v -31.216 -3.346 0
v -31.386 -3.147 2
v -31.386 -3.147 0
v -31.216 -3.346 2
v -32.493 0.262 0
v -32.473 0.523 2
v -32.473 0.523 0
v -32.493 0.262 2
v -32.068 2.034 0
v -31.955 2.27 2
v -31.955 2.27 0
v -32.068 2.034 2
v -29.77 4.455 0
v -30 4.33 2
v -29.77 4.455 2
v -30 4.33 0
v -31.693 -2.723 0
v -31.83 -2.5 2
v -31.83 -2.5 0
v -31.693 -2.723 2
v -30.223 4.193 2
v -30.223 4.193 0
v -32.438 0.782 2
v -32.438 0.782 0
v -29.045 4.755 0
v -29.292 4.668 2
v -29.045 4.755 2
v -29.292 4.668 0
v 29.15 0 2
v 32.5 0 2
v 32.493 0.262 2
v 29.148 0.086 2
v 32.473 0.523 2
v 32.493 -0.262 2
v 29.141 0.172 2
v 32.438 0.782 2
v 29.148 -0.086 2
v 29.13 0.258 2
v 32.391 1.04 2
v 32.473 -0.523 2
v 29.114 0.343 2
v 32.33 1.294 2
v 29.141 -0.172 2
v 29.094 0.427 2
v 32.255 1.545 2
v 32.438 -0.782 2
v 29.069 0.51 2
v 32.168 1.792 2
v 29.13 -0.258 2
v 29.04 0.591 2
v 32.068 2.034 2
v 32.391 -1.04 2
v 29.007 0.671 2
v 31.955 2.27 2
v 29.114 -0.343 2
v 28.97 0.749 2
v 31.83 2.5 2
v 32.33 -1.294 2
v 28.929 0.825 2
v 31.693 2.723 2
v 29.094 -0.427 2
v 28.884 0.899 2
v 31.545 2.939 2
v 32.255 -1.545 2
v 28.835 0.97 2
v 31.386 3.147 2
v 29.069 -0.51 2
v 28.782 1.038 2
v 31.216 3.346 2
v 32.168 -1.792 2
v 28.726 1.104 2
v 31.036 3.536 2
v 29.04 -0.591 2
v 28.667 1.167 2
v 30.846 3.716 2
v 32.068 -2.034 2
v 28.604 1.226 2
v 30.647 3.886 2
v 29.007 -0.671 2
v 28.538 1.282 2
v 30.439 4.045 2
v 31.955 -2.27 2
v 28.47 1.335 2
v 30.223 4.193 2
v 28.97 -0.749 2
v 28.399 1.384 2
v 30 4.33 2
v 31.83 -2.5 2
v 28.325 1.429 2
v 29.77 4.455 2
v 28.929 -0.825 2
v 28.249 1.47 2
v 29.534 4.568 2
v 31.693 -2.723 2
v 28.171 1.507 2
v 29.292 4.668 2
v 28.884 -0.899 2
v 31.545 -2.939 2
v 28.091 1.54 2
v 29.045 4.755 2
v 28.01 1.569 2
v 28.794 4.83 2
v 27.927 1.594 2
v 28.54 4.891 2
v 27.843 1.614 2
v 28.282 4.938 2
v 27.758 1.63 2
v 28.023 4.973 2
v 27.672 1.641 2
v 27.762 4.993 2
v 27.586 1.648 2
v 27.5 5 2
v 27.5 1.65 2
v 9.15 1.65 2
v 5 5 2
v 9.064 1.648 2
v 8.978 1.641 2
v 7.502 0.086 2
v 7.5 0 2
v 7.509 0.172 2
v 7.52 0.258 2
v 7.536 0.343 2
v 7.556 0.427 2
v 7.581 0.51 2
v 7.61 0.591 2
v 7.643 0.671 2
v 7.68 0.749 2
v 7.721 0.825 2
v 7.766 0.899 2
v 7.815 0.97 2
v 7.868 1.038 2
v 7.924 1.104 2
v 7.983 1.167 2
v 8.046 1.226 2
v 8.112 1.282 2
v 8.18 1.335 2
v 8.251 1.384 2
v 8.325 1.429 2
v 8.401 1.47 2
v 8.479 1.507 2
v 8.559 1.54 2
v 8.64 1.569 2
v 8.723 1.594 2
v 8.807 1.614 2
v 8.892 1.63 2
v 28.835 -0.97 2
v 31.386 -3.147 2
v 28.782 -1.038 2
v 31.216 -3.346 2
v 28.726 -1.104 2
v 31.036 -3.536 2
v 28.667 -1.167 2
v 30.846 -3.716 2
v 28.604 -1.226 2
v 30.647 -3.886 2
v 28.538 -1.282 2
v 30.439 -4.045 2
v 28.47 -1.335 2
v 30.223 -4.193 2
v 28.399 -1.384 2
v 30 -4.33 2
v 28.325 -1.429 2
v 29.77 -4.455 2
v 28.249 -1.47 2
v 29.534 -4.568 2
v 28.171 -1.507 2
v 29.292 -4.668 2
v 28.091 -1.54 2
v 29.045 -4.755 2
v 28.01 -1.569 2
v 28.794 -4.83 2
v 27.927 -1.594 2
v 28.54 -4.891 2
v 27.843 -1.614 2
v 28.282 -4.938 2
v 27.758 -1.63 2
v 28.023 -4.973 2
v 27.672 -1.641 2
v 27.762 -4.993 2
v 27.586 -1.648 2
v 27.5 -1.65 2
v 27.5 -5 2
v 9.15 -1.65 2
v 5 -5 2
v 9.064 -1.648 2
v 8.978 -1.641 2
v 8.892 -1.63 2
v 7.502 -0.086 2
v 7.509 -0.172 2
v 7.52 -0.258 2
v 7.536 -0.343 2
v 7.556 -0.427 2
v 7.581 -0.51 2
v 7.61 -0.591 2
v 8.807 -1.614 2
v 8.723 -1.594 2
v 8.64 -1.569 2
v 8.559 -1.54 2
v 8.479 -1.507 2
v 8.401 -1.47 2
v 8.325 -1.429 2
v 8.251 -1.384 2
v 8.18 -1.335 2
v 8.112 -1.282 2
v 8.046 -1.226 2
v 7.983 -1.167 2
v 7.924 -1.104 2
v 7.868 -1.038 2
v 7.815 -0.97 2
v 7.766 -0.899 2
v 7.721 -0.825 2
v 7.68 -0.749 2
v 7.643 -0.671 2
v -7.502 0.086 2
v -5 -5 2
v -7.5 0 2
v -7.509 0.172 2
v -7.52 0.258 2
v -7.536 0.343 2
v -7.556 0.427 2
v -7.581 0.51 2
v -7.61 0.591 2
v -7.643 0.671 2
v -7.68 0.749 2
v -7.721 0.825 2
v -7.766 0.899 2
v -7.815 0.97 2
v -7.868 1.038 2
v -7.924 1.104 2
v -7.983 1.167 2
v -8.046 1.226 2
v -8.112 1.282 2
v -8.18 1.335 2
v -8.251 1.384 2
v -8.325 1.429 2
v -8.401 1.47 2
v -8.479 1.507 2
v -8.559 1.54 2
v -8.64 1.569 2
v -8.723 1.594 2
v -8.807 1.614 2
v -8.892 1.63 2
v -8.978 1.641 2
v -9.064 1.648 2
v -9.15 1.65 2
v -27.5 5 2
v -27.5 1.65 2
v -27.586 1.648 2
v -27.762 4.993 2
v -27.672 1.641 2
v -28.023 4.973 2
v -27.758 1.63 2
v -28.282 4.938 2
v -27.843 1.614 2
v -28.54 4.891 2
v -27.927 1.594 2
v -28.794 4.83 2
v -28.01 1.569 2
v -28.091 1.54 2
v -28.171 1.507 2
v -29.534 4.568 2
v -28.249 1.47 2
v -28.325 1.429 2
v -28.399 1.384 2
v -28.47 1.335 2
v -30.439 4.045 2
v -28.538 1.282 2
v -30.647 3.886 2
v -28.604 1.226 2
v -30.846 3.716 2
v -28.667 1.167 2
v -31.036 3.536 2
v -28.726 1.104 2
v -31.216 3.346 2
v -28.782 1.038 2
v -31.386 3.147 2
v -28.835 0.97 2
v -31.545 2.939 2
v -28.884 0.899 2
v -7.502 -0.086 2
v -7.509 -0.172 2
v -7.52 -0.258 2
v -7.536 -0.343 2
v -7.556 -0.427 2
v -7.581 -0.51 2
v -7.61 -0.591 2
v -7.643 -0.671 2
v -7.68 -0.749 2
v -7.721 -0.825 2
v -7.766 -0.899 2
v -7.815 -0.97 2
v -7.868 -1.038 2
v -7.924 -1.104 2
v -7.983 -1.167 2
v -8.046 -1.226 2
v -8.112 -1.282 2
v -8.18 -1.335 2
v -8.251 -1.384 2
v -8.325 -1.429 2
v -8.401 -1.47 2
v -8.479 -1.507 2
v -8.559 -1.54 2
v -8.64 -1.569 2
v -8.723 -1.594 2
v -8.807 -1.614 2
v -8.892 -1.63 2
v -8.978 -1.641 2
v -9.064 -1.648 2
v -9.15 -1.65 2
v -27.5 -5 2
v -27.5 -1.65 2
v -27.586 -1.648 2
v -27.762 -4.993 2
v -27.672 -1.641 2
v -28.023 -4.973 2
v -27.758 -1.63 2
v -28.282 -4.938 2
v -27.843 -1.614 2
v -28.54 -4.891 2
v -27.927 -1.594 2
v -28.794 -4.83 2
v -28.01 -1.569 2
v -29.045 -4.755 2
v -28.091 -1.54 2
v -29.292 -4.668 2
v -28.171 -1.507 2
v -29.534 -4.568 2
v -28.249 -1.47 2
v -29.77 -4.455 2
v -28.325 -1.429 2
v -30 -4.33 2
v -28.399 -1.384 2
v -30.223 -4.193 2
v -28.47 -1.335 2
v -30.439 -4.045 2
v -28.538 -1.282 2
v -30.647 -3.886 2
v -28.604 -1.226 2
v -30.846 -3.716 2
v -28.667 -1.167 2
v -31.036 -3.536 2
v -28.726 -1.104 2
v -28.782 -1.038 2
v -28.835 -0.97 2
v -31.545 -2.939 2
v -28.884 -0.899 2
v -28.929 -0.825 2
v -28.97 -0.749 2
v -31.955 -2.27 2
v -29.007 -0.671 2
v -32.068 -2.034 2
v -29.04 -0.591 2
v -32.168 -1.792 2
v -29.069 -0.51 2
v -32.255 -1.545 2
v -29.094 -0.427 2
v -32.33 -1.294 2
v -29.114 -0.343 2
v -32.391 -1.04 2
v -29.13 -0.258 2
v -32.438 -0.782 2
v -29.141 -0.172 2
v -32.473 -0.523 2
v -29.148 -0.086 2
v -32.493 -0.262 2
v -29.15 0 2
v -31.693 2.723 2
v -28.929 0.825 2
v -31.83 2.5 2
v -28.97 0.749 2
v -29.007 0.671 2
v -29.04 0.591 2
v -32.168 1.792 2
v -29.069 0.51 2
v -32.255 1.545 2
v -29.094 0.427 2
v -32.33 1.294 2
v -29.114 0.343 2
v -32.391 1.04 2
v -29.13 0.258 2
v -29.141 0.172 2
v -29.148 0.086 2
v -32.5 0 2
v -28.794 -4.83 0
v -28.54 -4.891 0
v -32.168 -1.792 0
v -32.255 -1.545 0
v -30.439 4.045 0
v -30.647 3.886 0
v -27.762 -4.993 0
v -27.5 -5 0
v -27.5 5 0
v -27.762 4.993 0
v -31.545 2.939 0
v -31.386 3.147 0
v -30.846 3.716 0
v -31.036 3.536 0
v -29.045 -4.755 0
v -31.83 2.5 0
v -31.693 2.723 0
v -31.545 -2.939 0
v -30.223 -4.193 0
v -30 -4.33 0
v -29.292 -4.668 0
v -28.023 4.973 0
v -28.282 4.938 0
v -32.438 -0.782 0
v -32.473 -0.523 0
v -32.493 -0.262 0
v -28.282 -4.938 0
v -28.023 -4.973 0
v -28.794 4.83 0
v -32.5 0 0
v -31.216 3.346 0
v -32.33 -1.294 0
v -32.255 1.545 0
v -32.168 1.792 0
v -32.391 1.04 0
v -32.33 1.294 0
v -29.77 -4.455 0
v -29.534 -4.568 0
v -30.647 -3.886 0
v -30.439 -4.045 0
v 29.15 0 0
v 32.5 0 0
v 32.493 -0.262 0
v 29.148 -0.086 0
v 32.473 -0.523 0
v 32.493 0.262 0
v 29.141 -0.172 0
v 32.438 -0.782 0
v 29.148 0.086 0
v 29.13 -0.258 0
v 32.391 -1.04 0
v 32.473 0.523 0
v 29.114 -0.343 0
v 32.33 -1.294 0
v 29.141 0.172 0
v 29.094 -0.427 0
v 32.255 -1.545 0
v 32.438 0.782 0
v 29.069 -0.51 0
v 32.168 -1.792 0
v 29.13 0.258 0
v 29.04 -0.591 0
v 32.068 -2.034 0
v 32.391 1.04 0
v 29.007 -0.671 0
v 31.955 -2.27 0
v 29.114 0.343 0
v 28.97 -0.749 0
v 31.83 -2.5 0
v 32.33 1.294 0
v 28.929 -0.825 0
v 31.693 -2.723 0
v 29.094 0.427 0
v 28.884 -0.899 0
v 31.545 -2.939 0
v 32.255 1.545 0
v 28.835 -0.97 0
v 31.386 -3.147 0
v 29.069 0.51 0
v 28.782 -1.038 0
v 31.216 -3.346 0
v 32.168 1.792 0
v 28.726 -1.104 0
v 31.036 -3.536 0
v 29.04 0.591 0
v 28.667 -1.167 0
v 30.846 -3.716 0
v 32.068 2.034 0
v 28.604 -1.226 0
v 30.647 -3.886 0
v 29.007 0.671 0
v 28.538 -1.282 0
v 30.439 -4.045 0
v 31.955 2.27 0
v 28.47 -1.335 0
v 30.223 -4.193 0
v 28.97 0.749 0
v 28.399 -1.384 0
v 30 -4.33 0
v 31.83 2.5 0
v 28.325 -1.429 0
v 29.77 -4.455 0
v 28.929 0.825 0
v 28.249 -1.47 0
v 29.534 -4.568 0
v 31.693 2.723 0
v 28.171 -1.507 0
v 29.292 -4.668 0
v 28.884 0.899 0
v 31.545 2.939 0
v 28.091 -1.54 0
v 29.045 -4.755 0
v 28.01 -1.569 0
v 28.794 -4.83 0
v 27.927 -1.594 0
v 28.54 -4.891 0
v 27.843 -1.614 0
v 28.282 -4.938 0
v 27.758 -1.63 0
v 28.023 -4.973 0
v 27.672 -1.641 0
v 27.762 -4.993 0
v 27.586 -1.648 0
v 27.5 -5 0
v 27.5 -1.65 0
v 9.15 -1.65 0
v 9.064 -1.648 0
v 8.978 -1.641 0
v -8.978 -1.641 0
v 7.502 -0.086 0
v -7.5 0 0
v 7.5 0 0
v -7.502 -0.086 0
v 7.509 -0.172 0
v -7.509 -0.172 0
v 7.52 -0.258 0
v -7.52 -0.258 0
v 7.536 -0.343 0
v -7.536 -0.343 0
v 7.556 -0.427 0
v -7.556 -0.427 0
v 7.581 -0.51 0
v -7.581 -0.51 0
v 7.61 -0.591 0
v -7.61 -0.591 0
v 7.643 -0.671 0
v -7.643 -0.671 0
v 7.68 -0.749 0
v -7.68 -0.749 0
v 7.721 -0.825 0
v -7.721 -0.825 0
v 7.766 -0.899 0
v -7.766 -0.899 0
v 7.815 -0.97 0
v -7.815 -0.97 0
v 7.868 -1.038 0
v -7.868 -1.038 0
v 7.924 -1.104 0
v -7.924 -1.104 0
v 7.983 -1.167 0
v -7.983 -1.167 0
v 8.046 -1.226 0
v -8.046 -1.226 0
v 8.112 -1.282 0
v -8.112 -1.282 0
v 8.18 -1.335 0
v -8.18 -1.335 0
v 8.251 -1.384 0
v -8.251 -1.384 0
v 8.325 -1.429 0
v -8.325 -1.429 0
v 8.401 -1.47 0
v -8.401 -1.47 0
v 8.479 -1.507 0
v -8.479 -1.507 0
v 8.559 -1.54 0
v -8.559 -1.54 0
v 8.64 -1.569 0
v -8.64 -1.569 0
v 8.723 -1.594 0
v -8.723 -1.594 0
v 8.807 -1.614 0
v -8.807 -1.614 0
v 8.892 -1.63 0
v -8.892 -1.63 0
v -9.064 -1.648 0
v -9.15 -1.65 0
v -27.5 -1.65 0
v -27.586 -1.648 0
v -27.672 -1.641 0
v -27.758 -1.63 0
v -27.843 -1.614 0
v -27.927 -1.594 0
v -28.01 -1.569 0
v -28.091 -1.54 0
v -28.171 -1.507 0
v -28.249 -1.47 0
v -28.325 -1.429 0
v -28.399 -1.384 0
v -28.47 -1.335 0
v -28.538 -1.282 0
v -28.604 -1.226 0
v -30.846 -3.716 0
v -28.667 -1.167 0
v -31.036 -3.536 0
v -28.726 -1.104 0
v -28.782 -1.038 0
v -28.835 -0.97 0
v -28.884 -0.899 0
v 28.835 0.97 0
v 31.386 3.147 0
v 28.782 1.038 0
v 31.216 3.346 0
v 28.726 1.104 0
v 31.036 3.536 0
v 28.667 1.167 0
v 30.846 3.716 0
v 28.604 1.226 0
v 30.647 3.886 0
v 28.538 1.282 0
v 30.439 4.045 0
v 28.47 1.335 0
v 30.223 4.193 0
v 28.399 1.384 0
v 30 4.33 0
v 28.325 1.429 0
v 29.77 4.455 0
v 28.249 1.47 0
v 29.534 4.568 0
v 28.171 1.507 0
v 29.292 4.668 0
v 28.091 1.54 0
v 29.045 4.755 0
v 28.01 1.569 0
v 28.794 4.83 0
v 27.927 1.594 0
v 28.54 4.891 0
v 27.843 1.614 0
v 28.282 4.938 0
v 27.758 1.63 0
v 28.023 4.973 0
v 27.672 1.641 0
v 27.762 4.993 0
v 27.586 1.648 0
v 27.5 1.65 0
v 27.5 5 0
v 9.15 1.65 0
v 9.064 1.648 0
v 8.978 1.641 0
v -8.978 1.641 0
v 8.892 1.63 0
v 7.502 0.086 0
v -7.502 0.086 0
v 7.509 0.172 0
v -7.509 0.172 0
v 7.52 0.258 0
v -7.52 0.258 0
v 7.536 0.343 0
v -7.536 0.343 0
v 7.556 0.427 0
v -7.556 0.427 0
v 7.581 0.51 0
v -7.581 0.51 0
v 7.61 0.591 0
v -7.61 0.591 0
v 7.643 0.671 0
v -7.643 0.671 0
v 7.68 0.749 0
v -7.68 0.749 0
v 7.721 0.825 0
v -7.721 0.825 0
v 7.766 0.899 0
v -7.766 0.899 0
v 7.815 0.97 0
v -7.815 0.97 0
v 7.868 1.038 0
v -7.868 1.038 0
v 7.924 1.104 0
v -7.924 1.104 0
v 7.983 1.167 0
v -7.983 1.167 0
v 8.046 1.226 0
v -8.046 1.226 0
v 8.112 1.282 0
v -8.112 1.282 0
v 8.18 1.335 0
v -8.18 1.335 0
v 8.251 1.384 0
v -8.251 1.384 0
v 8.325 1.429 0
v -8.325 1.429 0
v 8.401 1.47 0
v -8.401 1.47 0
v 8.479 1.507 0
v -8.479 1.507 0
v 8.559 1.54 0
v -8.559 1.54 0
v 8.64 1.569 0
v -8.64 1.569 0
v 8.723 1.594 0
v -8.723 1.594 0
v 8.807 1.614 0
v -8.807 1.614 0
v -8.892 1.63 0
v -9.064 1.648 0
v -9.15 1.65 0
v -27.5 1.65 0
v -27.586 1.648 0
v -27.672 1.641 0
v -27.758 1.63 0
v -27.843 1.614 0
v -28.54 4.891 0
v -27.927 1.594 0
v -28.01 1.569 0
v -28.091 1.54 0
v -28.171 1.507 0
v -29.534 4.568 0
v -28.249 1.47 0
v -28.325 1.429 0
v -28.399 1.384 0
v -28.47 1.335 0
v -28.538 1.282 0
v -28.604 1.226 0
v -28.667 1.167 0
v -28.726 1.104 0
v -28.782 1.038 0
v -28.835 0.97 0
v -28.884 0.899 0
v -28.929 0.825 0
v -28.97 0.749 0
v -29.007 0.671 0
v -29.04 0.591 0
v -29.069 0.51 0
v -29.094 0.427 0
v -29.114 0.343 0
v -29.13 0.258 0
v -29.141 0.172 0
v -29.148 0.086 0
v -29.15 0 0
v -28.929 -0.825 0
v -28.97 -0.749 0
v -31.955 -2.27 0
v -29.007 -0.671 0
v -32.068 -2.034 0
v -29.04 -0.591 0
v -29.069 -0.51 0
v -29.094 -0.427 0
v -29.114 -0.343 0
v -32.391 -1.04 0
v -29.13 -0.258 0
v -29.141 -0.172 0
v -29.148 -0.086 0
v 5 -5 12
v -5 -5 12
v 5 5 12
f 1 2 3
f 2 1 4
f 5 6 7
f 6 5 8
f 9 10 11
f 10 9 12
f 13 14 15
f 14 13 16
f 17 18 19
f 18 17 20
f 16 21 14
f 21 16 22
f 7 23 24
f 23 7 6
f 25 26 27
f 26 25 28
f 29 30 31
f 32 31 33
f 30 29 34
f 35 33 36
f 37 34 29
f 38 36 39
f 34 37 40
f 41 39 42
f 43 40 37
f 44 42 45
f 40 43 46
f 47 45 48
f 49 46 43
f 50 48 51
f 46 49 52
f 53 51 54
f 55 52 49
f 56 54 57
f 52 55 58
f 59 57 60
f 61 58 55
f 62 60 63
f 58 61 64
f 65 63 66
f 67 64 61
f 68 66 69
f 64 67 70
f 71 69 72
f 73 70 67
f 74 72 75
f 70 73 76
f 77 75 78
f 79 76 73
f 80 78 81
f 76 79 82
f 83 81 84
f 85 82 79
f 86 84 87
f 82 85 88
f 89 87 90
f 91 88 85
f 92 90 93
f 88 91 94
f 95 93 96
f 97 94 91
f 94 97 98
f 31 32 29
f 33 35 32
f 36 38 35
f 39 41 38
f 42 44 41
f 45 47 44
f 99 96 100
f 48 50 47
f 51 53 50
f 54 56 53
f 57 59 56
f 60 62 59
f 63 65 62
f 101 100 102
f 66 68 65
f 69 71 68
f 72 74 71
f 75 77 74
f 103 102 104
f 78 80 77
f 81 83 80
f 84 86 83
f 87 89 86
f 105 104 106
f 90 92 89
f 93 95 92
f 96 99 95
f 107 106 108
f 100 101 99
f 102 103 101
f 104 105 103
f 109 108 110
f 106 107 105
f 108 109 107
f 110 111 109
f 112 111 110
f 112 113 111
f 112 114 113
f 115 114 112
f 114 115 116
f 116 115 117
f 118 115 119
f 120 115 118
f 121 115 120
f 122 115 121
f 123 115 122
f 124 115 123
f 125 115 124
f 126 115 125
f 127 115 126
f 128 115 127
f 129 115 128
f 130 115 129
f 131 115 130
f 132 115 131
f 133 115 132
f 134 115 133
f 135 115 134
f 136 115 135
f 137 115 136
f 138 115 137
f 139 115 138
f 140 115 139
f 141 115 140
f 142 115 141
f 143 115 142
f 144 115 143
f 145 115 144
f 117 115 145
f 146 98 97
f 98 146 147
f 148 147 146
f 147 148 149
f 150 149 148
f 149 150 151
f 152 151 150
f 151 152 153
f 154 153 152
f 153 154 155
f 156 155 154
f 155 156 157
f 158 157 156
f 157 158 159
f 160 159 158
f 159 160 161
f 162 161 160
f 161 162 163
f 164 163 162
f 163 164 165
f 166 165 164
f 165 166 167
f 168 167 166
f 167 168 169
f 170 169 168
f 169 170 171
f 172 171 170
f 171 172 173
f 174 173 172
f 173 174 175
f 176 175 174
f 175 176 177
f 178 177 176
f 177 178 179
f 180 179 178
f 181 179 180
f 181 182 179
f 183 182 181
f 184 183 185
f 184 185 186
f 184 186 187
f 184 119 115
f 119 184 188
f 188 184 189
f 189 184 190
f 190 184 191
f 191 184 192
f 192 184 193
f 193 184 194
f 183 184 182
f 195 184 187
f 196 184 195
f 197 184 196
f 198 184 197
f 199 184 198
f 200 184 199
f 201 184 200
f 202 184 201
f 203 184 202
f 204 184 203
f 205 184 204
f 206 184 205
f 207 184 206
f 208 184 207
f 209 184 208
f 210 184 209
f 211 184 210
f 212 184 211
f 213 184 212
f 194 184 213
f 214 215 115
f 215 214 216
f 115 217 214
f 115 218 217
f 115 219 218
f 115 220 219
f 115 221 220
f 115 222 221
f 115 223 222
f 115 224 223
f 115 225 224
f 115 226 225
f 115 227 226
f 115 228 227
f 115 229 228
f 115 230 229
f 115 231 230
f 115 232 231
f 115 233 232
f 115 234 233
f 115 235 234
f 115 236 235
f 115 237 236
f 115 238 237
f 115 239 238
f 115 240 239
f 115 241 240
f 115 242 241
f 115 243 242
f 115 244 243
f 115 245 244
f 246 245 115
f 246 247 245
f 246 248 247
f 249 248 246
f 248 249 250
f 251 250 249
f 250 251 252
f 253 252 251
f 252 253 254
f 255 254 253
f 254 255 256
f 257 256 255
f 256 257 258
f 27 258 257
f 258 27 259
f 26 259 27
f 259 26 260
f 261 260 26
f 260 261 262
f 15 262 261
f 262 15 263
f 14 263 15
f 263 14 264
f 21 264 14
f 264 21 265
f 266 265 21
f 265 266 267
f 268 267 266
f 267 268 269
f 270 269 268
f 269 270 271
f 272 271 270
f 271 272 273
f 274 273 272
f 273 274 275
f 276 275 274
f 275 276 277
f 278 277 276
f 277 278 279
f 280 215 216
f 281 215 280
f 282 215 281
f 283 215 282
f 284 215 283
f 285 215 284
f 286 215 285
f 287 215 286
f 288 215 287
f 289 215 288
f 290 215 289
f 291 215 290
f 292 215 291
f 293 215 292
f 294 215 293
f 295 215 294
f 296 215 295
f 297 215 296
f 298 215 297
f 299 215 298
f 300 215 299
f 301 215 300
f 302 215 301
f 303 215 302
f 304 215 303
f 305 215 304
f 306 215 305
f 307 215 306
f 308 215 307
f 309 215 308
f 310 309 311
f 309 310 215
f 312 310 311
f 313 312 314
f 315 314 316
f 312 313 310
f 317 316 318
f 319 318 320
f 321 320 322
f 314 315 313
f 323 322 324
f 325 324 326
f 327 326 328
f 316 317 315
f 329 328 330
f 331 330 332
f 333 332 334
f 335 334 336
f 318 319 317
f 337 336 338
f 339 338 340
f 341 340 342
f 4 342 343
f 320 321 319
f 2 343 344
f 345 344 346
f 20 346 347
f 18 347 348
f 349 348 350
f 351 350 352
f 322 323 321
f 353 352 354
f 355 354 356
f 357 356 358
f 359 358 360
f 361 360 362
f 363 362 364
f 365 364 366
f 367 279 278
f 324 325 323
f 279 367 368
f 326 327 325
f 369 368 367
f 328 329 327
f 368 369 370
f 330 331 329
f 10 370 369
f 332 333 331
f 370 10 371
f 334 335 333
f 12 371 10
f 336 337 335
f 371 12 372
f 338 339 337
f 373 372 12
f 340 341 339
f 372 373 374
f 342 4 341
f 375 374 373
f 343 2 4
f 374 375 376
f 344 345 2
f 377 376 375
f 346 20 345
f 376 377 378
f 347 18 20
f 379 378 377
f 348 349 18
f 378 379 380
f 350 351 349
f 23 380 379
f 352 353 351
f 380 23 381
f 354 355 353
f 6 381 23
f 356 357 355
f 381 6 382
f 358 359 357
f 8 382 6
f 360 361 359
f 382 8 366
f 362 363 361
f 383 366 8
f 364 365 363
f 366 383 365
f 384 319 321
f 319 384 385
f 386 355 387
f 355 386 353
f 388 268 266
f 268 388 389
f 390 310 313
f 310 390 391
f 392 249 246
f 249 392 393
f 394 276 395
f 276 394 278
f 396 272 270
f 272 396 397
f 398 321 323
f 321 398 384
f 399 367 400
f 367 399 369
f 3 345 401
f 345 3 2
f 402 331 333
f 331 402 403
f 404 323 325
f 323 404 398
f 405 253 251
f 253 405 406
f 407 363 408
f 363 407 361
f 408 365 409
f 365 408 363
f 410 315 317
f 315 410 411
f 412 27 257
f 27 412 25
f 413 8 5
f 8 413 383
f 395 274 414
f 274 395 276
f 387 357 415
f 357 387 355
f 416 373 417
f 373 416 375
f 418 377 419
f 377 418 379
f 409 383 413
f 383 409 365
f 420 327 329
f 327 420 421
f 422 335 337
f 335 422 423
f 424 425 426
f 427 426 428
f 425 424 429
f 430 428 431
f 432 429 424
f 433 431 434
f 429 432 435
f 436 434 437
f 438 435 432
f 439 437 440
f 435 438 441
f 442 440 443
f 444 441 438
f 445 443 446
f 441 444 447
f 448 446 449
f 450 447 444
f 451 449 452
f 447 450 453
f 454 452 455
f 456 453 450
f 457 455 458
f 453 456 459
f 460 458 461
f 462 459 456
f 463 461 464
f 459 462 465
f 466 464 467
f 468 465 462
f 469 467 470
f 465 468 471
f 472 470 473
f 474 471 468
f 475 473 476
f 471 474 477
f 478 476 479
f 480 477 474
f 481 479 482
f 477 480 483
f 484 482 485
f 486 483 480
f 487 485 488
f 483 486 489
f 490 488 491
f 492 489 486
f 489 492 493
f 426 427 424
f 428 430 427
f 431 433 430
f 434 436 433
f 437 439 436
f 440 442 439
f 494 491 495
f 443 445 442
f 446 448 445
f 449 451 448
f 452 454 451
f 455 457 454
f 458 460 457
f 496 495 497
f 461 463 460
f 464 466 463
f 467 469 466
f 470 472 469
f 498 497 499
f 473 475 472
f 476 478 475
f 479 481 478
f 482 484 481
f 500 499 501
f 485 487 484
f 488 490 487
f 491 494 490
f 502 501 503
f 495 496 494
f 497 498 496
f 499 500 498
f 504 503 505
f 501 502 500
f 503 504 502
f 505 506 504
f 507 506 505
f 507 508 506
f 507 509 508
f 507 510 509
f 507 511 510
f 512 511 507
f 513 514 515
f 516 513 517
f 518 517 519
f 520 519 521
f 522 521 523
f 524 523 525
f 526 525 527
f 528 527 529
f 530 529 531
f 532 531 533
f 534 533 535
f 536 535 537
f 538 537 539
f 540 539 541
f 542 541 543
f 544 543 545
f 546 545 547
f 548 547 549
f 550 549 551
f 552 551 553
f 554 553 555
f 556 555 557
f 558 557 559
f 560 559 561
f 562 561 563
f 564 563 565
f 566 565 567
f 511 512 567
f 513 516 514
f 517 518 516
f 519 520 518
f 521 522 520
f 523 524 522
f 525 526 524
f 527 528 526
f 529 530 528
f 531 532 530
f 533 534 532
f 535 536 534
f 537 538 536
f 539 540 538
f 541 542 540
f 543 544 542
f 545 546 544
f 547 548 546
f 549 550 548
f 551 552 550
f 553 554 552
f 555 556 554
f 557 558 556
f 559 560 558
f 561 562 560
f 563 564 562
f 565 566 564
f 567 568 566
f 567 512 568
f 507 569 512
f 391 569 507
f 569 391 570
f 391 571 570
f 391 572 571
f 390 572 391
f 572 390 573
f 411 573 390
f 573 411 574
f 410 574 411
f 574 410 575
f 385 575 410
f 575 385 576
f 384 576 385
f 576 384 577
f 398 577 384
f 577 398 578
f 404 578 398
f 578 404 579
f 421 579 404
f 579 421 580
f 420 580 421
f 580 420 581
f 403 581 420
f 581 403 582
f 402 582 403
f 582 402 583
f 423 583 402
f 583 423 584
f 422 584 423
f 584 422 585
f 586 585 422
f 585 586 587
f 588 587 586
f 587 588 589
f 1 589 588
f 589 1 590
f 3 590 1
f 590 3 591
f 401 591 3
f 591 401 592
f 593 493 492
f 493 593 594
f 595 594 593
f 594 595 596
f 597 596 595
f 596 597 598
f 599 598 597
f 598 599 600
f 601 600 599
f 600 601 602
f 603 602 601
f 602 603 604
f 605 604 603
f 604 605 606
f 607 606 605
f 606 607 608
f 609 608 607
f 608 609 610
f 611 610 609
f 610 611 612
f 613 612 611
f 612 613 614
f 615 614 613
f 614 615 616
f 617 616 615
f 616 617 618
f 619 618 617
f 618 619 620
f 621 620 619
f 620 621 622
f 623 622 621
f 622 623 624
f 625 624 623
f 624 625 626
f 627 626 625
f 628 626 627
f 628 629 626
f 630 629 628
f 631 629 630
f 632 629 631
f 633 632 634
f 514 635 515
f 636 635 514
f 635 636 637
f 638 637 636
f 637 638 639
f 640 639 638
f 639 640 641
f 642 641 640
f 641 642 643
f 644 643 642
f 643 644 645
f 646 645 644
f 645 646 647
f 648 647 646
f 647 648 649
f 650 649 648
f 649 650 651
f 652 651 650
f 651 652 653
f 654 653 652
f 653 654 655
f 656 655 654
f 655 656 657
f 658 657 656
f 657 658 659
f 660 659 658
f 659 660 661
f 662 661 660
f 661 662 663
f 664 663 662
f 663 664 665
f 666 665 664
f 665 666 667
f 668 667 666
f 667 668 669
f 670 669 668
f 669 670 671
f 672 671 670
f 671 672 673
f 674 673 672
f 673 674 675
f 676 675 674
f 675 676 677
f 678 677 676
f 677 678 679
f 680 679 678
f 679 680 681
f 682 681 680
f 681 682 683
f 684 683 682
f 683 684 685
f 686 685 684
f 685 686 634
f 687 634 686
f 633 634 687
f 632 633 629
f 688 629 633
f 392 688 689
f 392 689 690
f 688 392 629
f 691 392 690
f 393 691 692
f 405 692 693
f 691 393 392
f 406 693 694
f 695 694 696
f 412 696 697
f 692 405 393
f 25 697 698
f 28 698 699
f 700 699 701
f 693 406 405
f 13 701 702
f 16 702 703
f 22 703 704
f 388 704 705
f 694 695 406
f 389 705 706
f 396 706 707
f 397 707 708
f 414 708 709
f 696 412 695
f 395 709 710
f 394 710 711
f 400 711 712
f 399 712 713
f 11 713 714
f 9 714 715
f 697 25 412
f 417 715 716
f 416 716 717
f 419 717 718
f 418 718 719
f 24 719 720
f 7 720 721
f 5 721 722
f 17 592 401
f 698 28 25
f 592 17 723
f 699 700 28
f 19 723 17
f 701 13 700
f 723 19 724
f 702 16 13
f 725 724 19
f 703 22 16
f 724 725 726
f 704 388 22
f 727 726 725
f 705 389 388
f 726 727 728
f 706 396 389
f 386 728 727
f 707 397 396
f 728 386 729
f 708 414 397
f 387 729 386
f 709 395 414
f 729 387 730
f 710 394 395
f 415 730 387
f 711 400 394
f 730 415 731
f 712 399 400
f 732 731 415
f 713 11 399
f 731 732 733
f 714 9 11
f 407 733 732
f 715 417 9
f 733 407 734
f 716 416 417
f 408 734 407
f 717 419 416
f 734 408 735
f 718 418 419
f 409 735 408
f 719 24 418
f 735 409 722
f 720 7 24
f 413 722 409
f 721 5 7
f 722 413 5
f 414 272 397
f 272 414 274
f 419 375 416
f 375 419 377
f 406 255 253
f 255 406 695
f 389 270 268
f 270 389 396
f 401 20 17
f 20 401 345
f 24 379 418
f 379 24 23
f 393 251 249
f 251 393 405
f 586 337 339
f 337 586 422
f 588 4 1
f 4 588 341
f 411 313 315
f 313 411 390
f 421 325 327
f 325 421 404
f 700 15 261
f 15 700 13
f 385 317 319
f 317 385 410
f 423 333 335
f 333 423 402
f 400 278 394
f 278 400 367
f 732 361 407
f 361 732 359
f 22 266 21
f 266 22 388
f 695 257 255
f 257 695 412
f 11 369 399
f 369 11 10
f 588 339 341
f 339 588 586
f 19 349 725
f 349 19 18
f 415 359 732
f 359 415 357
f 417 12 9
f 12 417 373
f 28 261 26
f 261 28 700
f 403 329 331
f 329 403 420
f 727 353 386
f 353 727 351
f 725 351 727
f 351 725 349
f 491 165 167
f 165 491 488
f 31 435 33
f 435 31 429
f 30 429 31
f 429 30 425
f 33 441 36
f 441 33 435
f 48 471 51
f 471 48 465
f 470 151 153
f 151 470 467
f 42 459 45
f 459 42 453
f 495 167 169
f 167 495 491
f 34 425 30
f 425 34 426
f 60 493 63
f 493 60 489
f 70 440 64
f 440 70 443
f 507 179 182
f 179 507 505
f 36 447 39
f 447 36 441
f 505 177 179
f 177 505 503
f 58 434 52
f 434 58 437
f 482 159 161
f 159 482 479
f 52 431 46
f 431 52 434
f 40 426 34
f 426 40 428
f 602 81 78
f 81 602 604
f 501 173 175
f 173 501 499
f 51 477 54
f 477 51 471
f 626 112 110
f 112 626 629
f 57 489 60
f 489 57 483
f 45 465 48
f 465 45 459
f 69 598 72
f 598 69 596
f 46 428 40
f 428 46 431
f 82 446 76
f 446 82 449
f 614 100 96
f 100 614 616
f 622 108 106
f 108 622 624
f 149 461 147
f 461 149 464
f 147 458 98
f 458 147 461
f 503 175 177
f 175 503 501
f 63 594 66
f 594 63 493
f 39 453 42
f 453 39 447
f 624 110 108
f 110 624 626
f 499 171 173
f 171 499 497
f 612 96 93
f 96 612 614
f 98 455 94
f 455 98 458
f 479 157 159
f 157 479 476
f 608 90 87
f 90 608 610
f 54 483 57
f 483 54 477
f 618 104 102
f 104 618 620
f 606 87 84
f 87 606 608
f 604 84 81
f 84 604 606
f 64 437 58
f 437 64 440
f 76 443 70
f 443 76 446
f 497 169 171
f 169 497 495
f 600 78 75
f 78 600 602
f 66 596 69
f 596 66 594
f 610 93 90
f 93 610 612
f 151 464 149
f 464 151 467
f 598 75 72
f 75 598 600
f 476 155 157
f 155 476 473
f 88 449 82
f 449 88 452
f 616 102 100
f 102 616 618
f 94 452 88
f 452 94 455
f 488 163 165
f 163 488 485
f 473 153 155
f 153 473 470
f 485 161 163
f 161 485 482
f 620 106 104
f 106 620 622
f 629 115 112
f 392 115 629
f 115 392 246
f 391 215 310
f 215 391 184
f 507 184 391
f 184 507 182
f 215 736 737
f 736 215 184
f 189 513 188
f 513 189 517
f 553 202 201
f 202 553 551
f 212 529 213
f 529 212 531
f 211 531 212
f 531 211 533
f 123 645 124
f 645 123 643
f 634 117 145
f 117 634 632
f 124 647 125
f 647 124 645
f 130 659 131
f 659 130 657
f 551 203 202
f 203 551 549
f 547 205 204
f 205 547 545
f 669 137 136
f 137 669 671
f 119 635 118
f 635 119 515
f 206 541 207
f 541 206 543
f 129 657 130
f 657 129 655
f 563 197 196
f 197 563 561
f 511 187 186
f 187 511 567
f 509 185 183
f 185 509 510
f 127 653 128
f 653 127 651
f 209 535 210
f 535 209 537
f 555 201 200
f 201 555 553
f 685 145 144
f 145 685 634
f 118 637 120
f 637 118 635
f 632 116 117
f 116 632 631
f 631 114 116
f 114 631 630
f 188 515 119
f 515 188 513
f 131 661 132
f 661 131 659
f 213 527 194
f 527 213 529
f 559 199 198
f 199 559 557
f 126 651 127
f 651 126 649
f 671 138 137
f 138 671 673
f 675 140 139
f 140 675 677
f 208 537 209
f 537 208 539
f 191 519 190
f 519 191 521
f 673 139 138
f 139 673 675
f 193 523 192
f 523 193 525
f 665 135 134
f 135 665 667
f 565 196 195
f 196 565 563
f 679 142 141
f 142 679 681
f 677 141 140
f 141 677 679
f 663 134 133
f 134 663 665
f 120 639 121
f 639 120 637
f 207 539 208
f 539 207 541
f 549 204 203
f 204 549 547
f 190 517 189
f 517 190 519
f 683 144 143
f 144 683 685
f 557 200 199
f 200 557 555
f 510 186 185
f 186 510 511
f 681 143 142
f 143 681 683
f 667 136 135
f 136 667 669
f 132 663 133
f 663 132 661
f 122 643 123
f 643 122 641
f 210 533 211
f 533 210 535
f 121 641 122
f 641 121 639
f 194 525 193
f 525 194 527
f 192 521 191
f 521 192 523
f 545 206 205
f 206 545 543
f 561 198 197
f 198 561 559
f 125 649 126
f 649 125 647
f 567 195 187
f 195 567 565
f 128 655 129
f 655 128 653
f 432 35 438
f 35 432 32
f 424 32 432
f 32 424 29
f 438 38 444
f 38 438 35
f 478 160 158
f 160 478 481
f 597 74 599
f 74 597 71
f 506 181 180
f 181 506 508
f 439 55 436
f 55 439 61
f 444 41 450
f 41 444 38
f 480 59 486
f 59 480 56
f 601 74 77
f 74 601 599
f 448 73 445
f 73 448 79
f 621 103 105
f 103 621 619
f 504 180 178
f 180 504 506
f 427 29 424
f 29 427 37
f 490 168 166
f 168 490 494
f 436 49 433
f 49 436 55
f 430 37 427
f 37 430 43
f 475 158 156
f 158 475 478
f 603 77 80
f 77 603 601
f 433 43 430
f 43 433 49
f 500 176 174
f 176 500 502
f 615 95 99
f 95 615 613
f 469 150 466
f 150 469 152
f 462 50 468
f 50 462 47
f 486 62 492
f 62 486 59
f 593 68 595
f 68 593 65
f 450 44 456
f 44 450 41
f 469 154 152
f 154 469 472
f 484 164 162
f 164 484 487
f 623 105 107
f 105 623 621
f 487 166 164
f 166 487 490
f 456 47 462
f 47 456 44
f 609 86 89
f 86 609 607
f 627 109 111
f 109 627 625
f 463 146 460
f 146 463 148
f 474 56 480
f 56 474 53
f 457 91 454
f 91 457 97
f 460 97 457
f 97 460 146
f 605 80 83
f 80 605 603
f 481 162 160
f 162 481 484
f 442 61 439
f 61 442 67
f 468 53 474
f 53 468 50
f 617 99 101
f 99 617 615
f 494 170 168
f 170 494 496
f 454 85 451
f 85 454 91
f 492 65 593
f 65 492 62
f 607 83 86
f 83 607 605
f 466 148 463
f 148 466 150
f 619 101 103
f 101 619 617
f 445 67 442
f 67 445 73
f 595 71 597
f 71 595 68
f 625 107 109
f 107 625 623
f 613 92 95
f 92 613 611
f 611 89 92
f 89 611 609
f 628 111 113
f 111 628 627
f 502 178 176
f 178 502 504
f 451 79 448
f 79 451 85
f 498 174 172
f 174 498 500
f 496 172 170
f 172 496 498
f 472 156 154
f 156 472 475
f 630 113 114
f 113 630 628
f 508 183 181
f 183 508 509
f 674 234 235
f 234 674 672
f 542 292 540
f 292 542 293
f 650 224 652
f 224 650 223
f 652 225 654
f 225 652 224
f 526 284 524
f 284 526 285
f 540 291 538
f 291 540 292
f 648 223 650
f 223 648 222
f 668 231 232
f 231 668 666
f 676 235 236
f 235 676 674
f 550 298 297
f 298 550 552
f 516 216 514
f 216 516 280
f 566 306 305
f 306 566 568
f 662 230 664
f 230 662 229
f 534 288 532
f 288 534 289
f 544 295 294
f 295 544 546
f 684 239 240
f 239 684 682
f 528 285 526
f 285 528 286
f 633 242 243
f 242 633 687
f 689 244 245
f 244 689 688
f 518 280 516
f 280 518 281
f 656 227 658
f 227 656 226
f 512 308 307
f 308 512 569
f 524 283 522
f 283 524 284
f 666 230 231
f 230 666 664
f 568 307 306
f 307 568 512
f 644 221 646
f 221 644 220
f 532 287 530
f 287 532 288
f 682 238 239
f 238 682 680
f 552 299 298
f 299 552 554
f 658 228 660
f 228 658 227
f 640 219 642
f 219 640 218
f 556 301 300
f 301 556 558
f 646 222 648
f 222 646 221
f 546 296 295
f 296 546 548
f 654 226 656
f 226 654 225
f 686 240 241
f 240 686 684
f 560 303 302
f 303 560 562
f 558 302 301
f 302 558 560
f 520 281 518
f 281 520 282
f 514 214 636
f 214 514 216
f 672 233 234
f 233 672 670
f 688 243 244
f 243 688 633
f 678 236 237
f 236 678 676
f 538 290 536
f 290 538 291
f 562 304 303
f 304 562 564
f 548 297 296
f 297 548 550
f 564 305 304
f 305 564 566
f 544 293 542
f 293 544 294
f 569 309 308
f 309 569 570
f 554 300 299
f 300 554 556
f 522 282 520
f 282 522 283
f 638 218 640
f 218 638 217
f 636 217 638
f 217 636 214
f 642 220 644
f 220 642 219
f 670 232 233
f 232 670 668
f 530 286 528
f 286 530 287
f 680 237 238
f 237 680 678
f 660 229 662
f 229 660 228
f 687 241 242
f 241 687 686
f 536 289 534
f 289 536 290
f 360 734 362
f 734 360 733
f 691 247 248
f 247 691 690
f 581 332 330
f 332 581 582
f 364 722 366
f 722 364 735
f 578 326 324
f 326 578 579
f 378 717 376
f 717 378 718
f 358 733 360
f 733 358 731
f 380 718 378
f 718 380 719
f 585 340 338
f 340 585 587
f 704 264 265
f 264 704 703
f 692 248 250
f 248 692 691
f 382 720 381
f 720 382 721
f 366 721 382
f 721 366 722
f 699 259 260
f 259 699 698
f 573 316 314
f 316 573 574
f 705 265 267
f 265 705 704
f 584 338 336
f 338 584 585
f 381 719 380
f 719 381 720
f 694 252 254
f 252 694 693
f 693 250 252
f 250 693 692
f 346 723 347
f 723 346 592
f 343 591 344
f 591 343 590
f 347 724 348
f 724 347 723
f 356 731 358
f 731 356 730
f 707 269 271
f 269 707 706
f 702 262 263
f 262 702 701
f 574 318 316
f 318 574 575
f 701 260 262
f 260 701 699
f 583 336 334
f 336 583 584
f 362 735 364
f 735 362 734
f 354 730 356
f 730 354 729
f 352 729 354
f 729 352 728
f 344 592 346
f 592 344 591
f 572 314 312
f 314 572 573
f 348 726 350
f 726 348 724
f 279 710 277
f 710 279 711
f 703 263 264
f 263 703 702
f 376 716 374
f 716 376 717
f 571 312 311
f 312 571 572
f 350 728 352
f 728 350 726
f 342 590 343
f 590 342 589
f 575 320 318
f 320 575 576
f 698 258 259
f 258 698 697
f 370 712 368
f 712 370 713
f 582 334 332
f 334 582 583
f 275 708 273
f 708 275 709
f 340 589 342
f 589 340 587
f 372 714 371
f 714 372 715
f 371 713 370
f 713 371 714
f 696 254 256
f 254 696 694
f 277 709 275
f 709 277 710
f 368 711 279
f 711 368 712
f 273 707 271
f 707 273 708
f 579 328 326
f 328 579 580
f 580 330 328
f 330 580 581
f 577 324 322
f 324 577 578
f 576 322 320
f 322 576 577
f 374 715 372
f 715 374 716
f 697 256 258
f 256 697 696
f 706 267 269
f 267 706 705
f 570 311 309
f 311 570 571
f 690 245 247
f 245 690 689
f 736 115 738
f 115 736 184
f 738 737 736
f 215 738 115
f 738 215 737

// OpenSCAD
// Picture hanger
// Picutre part / left side
// RealGusi (C) 2020
// https://maniana.net
// Creative Commons - Attribution - Non-Commercial - Share Alike license.

$fn = 120;

$thickness = 2;
$slide_length = 20;
$width = 10;
$screw_width = 3.3;

$wedge_section = 15;

module whole_part() {
  translate( [-$slide_length - $wedge_section / 2, 0, 0])
  cylinder( h = $thickness, r = $width/ 2);
    
  translate( [ $slide_length + $wedge_section / 2, 0, 0])
  cylinder( h = $thickness, r = $width/ 2);
    
  translate( [-$slide_length - $wedge_section / 2, -$width / 2, 0])
  cube( [ $slide_length * 2 + $wedge_section, $width, $thickness]);
}

module screw_hole( angle) {
  rotate( [ 0, 0, angle])
  translate( [ $wedge_section / 2, 0, 0]) 
  translate( [ $screw_width / 2, 0, 0]) 
  cylinder( h = $thickness, r = $screw_width/ 2);
    
  rotate( [ 0, 0, angle])
  translate( [ $wedge_section / 2, 0, 0]) 
  translate( [ $slide_length, 0, 0]) 
  cylinder( h = $thickness, r = $screw_width/ 2);
    
  rotate( [ 0, 0, angle])
  translate( [ $wedge_section / 2, 0, 0]) 
  translate( [ $screw_width / 2, - $screw_width / 2, 0]) 
  cube( [ $slide_length - $screw_width / 2, $screw_width, $thickness]);
}    

difference() {
  whole_part();
  screw_hole( 0);
  screw_hole( 180);
}

difference() {
  translate( [ -5, - $width / 2, $thickness]) 
  cube( [ 10, 10, 10]);

  rotate( [ 0, 0, 45])
  translate( [ - sqrt( 10 * 10 + 10 * 10) / 2, 0, $thickness]) 
  cube( [ sqrt( 10 * 10 + 10 * 10), sqrt( 10 * 10 + 10 * 10), 10]);
}
